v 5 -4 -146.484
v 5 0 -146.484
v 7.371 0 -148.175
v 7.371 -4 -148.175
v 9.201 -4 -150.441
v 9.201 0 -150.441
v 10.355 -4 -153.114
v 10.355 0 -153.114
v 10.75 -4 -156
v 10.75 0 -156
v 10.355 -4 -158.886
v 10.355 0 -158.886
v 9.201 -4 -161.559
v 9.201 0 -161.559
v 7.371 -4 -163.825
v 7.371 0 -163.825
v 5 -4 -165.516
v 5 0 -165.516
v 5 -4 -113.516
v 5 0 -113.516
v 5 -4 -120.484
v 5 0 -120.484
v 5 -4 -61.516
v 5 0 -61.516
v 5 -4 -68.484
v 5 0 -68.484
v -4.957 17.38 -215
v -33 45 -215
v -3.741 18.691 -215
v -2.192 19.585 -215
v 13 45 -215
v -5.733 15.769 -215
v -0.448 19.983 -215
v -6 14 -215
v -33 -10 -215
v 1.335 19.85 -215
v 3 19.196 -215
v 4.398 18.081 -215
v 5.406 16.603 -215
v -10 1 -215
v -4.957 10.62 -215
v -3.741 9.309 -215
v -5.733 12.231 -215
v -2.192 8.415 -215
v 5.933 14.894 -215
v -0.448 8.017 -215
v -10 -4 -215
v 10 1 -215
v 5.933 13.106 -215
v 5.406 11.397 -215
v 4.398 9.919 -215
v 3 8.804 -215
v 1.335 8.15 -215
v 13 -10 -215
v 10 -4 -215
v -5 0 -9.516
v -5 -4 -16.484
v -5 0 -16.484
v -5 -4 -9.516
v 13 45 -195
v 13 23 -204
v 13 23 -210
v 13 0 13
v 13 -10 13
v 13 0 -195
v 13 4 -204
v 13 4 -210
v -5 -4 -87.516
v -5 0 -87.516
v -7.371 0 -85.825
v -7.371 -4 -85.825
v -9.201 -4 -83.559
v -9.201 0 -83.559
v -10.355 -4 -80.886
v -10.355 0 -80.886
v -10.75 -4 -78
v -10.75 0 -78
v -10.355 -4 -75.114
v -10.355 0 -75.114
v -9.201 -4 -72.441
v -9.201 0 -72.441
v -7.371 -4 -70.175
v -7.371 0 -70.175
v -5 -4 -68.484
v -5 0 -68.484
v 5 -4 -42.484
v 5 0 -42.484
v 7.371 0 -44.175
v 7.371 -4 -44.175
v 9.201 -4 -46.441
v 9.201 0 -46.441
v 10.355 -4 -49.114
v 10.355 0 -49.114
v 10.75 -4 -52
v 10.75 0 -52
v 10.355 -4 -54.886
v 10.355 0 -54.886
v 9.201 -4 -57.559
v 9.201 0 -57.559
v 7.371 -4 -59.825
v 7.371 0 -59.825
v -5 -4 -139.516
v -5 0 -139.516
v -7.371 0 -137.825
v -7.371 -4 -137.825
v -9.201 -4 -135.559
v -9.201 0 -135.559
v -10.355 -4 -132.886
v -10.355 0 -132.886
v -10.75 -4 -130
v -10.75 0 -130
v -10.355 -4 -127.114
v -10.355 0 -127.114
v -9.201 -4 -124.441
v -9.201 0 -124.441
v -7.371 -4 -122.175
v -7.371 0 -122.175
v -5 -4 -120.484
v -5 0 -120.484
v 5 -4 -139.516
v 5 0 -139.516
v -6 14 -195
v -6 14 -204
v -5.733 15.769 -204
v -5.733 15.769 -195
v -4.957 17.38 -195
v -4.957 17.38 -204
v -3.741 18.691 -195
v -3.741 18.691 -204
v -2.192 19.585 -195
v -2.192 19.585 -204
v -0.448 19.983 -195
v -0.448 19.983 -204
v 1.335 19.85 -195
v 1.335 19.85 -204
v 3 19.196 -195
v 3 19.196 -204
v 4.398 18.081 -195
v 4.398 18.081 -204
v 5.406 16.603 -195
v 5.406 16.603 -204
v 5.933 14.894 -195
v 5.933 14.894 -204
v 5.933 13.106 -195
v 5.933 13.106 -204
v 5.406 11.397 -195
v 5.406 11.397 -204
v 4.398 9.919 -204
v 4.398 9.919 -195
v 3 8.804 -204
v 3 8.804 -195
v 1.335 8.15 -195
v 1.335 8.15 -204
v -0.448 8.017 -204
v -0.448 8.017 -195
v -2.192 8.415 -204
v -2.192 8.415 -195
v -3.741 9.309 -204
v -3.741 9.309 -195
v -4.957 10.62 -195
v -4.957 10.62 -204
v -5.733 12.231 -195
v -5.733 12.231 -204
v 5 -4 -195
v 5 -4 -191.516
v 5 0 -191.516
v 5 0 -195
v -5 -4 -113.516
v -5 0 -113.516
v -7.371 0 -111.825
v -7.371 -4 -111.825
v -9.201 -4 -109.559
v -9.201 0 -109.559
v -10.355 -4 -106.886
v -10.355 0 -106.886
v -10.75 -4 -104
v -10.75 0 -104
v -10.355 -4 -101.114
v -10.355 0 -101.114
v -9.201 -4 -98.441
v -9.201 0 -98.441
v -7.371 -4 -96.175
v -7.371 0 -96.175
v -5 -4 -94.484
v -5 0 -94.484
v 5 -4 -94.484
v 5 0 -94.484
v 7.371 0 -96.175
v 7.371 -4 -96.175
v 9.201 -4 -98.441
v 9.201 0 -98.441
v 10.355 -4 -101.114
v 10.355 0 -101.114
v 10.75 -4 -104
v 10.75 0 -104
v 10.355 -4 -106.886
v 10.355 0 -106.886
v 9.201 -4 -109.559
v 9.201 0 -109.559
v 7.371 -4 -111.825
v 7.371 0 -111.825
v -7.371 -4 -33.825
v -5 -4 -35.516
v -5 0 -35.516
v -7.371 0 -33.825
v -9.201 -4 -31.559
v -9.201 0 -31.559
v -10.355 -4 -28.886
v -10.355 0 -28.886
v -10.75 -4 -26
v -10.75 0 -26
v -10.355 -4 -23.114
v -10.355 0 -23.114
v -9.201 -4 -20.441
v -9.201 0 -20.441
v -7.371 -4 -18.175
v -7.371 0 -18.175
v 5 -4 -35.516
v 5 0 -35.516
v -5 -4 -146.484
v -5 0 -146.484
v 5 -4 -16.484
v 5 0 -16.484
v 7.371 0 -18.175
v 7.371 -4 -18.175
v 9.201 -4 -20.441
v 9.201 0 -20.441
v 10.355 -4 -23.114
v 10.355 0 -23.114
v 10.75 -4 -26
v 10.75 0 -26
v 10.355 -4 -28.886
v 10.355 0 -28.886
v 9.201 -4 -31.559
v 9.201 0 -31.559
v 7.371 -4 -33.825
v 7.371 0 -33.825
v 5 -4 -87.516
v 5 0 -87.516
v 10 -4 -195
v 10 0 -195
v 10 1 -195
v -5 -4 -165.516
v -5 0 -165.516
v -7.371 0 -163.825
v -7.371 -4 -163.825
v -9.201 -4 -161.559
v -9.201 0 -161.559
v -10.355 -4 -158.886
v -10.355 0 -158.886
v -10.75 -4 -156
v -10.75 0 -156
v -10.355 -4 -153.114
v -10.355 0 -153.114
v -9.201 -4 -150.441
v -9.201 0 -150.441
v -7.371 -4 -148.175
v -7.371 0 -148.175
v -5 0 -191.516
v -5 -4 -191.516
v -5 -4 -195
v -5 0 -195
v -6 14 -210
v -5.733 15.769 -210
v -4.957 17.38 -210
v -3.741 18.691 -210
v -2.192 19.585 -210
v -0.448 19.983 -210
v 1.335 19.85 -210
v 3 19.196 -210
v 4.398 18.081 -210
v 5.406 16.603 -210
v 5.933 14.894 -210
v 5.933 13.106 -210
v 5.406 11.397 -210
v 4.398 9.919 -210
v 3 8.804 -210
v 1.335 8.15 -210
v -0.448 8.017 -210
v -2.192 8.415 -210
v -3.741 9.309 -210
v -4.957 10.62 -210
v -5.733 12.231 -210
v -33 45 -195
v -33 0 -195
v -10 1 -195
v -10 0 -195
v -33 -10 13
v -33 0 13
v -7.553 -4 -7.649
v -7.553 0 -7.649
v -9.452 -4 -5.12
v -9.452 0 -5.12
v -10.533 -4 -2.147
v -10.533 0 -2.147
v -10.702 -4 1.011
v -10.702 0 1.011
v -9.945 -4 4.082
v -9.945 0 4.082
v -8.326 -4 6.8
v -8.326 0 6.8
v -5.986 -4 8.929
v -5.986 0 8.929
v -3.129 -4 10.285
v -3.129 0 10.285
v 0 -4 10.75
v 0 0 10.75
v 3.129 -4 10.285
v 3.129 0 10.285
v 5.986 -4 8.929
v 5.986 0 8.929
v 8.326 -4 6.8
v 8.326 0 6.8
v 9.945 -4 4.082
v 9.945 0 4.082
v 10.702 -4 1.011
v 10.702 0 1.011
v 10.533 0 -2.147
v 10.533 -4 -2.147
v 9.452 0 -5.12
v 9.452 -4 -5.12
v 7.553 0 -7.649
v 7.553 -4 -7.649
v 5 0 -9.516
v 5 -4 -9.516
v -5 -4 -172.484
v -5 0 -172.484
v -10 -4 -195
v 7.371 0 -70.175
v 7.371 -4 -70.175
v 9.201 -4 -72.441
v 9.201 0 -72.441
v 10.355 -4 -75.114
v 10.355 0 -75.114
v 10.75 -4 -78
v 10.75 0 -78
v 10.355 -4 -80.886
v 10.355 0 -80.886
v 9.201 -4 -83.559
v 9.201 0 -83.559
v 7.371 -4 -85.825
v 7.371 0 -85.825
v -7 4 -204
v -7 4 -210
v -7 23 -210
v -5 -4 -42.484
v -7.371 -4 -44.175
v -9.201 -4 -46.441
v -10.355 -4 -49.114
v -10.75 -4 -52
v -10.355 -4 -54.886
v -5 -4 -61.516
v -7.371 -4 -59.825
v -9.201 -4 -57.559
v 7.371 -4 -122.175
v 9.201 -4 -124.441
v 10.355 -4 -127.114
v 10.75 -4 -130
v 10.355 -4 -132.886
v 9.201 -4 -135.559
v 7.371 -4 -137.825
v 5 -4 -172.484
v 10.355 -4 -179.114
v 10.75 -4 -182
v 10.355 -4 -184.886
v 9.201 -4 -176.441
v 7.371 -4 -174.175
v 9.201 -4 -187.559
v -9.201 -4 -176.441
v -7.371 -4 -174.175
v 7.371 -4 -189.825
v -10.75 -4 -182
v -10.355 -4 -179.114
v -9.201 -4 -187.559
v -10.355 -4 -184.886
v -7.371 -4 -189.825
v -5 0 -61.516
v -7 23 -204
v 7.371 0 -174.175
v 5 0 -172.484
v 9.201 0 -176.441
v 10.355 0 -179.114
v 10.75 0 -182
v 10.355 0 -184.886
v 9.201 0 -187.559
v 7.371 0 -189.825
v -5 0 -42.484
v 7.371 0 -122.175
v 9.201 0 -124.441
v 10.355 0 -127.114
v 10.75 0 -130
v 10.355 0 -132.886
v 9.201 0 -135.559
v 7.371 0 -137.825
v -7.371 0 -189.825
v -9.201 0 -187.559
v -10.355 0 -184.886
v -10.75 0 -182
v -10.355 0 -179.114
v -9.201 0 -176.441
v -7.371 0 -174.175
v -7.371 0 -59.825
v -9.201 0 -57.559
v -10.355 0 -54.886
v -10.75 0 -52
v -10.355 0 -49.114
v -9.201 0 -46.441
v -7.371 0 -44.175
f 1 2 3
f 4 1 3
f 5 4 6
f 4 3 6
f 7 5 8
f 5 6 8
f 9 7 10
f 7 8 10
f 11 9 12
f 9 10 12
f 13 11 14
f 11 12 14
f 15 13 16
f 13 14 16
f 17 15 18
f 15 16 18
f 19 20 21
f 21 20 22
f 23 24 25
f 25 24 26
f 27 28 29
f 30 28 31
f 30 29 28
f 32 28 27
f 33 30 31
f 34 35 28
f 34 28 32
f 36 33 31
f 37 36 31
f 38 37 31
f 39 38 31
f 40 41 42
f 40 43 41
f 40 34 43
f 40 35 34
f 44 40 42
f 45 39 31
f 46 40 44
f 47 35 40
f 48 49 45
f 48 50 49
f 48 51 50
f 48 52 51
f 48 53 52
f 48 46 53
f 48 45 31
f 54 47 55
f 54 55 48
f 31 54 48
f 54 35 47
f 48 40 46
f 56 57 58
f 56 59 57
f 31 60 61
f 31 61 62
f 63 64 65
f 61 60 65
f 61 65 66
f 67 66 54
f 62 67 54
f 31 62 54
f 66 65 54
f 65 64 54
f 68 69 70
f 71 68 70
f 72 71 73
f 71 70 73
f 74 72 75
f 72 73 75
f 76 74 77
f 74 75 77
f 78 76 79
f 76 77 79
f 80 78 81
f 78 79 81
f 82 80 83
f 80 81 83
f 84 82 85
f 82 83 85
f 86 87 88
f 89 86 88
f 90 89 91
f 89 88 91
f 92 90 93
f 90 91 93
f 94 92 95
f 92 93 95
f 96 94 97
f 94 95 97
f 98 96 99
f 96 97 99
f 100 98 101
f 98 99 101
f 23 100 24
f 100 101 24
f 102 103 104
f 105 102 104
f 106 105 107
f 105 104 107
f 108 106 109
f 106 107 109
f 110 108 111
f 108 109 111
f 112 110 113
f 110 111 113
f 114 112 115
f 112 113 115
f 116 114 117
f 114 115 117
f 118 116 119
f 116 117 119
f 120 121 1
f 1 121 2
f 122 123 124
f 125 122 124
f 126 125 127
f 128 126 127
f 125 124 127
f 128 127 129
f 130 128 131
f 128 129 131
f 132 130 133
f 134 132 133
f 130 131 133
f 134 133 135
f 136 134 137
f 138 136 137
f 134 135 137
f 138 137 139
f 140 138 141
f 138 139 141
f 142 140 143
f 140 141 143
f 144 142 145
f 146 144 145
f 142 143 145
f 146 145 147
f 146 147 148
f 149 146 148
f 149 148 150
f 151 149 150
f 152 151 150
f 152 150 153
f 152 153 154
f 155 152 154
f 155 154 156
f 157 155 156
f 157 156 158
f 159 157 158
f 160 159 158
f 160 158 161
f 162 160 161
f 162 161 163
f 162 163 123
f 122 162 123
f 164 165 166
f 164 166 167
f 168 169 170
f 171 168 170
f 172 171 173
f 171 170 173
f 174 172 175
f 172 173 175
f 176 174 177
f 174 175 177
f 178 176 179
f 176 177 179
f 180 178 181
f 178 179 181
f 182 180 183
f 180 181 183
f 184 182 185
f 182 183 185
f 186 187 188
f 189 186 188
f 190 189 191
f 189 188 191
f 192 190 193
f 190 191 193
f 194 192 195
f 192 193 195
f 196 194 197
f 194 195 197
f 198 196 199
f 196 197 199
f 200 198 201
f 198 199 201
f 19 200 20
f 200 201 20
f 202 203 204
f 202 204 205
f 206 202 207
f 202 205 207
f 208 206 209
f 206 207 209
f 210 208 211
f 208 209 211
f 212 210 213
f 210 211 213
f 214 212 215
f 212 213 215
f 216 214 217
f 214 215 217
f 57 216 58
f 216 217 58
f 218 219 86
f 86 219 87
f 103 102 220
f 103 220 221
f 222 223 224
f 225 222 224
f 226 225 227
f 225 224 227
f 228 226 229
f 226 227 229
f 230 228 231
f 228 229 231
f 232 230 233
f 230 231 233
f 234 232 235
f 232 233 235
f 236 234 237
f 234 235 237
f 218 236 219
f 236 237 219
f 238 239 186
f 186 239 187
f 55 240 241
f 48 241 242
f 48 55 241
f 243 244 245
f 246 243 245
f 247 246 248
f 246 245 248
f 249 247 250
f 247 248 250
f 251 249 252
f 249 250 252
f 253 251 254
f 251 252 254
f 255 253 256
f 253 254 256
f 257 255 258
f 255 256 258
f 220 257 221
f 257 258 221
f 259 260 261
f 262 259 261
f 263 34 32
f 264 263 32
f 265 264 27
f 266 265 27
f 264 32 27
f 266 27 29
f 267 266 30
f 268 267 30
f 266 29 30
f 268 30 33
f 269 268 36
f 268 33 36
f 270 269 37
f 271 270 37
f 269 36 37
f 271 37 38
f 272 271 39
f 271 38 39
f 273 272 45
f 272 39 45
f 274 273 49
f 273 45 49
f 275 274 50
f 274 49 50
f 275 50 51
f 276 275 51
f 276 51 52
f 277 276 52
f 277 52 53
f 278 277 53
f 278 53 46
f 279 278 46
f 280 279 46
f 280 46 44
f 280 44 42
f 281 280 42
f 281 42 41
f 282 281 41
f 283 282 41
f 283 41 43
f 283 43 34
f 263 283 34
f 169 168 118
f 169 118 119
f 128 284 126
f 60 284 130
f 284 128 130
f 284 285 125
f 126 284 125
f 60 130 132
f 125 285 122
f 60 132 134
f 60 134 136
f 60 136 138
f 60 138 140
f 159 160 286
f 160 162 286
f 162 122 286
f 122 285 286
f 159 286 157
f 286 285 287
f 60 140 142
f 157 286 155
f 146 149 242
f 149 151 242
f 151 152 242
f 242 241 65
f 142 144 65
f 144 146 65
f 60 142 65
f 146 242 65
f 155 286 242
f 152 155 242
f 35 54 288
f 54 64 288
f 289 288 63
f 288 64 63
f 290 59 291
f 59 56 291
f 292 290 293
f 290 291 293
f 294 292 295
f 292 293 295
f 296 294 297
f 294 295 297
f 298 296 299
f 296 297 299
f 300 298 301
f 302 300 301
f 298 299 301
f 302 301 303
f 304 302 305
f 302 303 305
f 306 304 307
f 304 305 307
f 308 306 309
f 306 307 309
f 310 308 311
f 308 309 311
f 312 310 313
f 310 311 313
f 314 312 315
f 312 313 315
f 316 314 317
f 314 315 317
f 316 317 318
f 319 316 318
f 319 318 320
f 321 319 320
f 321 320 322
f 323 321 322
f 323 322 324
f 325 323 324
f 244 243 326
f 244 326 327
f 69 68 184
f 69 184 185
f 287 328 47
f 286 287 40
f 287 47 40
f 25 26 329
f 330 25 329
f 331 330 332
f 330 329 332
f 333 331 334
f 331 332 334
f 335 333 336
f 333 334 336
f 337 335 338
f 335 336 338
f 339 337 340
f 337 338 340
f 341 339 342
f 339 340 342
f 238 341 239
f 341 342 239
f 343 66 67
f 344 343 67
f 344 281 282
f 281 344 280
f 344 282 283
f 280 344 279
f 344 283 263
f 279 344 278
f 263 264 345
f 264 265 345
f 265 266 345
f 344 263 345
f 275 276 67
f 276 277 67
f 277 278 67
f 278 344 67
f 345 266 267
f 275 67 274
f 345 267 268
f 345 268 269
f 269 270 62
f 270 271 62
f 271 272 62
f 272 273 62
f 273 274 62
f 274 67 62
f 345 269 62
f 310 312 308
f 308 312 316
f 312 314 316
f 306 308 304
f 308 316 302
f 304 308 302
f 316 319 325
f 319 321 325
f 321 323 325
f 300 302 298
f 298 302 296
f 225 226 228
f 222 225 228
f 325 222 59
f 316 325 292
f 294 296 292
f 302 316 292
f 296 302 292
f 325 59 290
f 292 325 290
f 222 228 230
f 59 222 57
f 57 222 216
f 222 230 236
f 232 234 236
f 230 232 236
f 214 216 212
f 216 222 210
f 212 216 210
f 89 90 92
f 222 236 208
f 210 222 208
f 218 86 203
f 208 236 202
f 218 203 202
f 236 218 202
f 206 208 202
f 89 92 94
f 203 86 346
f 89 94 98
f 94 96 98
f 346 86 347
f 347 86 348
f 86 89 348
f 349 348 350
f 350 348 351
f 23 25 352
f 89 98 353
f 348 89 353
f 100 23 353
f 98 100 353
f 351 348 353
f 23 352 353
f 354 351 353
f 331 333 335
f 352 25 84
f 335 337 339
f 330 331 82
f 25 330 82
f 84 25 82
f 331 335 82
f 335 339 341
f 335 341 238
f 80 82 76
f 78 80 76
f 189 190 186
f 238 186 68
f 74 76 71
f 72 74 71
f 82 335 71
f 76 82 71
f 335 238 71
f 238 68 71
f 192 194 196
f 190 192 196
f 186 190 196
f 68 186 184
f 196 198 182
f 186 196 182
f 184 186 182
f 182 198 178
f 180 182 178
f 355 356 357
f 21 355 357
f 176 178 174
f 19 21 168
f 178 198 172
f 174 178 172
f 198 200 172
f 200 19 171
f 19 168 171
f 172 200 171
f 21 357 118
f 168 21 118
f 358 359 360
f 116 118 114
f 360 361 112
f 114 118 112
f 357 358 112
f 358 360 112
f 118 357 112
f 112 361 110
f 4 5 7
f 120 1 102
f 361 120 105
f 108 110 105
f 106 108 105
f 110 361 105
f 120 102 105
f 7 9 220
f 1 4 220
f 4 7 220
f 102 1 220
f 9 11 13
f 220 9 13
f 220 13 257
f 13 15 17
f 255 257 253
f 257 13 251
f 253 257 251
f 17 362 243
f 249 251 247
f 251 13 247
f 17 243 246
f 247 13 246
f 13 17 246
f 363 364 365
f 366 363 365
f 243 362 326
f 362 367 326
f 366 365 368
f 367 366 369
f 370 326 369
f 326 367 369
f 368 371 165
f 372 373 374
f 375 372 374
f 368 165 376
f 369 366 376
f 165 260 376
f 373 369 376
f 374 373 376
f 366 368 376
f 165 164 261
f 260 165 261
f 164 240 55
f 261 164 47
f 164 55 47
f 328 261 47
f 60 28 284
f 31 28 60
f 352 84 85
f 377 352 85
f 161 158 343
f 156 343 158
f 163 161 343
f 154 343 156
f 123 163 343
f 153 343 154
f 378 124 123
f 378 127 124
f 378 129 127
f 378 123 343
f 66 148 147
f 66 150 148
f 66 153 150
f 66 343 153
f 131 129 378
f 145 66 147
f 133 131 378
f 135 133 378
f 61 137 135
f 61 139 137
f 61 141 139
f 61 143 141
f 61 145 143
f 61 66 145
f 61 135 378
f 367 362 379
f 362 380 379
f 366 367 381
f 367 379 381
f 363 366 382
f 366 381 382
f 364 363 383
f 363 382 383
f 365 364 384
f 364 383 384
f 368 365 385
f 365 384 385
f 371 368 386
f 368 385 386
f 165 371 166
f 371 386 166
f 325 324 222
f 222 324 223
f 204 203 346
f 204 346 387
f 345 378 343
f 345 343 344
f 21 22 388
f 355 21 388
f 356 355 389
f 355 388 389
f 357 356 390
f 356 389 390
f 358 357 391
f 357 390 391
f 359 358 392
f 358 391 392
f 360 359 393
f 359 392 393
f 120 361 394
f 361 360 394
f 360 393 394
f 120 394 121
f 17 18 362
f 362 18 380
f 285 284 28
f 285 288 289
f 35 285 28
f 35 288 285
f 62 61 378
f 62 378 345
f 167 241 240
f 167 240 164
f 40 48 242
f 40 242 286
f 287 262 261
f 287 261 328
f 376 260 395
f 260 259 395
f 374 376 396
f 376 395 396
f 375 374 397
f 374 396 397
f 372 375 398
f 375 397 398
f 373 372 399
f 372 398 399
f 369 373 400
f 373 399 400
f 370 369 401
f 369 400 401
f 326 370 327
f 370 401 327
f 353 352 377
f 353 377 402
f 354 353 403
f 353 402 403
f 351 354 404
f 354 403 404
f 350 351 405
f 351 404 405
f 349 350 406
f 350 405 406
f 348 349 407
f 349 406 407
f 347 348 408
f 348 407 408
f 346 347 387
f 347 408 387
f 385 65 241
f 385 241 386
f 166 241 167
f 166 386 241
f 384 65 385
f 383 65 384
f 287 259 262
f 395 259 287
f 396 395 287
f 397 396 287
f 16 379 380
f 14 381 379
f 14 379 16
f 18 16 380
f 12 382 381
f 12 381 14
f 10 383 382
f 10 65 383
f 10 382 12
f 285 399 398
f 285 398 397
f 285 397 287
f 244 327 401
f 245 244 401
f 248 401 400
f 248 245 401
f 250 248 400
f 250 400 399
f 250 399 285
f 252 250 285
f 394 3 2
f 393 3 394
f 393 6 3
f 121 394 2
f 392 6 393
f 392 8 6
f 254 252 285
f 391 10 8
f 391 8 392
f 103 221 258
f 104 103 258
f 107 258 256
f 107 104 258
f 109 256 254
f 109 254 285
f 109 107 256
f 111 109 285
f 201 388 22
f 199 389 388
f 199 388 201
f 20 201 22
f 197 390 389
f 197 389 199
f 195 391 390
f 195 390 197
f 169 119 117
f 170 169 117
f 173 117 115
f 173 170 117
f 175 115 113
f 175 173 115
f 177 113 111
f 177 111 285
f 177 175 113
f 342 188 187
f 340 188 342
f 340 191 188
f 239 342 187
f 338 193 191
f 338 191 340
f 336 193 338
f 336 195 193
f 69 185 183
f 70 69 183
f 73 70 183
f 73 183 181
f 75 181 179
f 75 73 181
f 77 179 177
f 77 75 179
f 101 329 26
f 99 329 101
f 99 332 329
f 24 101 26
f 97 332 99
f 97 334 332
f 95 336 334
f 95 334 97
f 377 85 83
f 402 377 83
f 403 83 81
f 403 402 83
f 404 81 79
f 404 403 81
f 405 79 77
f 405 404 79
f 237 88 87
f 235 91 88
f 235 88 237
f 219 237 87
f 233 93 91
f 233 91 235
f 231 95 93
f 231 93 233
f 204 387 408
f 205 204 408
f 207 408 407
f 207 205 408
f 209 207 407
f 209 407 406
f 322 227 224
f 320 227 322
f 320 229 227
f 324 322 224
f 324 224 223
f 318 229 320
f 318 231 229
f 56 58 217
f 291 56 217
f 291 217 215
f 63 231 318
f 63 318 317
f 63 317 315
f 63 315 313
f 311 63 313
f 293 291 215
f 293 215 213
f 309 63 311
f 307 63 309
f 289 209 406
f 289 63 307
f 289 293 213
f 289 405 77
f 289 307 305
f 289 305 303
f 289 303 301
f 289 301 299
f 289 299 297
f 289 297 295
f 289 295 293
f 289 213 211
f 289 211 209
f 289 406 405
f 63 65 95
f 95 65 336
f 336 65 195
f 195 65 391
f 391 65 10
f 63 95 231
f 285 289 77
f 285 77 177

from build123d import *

# Parameters (mm, degrees)
SKETCH5_W           = 26
SKETCH5_H           = 26
BOSS_EXTRUDE1_DEPTH = 10
SKETCH4_R           = 10.75
CUT_EXTRUDE1_DEPTH  = 4
SKETCH6_W           = 10
SKETCH6_H           = 3.483566845
CUT_EXTRUDE2_DEPTH  = 4
LPATTERN1_COUNT     = 8
LPATTERN1_PITCH     = 26
SKETCH7_W           = 10
SKETCH7_H           = 4
CUT_EXTRUDE3_DEPTH  = 183
SKETCH8_W           = 208
SKETCH8_H           = 10
BOSS_EXTRUDE2_DEPTH = 20
SKETCH9_W           = 46
SKETCH9_H           = 10
BOSS_EXTRUDE3_DEPTH = 20
SKETCH10_W          = 46
SKETCH10_H          = 20
BOSS_EXTRUDE4_DEPTH = 45
SKETCH13_W          = 20
SKETCH13_H          = 5
CUT_EXTRUDE4_DEPTH  = 20
SKETCH14_R          = 6
CUT_EXTRUDE5_DEPTH  = 45
SKETCH15_W          = 6
SKETCH15_H          = 19
CUT_EXTRUDE6_DEPTH  = 20


with BuildPart() as part:
    # Sketch5 → Boss-Extrude1 (new body)
    with BuildSketch(Plane(origin=(0, 0, 0), x_dir=(1, 0, 0), z_dir=(0, 1, 0))):
        Rectangle(SKETCH5_W, SKETCH5_H)
    boss_extrude1 = extrude(amount=-BOSS_EXTRUDE1_DEPTH)

    # Sketch4 → Cut-Extrude1 (cut)
    with BuildSketch(Plane(origin=(0, 0, 0), x_dir=(1, 0, 0), z_dir=(0, 1, 0))):
        Circle(SKETCH4_R)
    cut_extrude1 = extrude(amount=-CUT_EXTRUDE1_DEPTH, mode=Mode.SUBTRACT)

    # Sketch6 → Cut-Extrude2 (cut)
    with BuildSketch(Plane(origin=(0, 0, 0), x_dir=(1, 0, 0), z_dir=(0, 1, 0))):
        with Locations((0, 11.258216578)):
            Rectangle(SKETCH6_W, SKETCH6_H)
    cut_extrude2 = extrude(amount=-CUT_EXTRUDE2_DEPTH, mode=Mode.SUBTRACT)

    # LPattern1: Boss-Extrude1, Cut-Extrude1, Cut-Extrude2 ×8
    with Locations(*[(0, 0, -i * LPATTERN1_PITCH) for i in range(1, LPATTERN1_COUNT)]):
        add(boss_extrude1)
        add(cut_extrude1, mode=Mode.SUBTRACT)
        add(cut_extrude2, mode=Mode.SUBTRACT)

    # Sketch7 → Cut-Extrude3 (cut, through all)
    with BuildSketch(Plane.XY.offset(-13)):
        with Locations((0, -2)):
            Rectangle(SKETCH7_W, SKETCH7_H)
    extrude(amount=-CUT_EXTRUDE3_DEPTH, mode=Mode.SUBTRACT)

    # Sketch8 → Boss-Extrude2 (add)
    with BuildSketch(Plane.ZY.offset(13)):
        with Locations((-91, -5)):
            Rectangle(SKETCH8_W, SKETCH8_H)
    extrude(amount=BOSS_EXTRUDE2_DEPTH)

    # Sketch9 → Boss-Extrude3 (add)
    with BuildSketch(Plane(origin=(0, 0, -195), x_dir=(-1, 0, 0), z_dir=(0, 0, -1))):
        with Locations((10, -5)):
            Rectangle(SKETCH9_W, SKETCH9_H)
    extrude(amount=BOSS_EXTRUDE3_DEPTH)

    # Sketch10 → Boss-Extrude4 (add)
    with BuildSketch(Plane(origin=(0, 0, 0), x_dir=(1, 0, 0), z_dir=(0, 1, 0))):
        with Locations((-10, 205)):
            Rectangle(SKETCH10_W, SKETCH10_H)
    extrude(amount=BOSS_EXTRUDE4_DEPTH)

    # Sketch13 → Cut-Extrude4 (cut)
    with BuildSketch(Plane(origin=(0, 0, -215), x_dir=(-1, 0, 0), z_dir=(0, 0, -1))):
        with Locations((0, -1.5)):
            Rectangle(SKETCH13_W, SKETCH13_H)
    extrude(amount=-CUT_EXTRUDE4_DEPTH, mode=Mode.SUBTRACT)

    # Sketch14 → Cut-Extrude5 (cut)
    with BuildSketch(Plane(origin=(0, 0, -215), x_dir=(-1, 0, 0), z_dir=(0, 0, -1))):
        with Locations((0, 14)):
            Circle(SKETCH14_R)
    extrude(amount=-CUT_EXTRUDE5_DEPTH, mode=Mode.SUBTRACT)

    # Sketch15 → Cut-Extrude6 (cut)
    with BuildSketch(Plane(origin=(13, 0, 0), x_dir=(0, 0, -1), z_dir=(1, 0, 0))):
        with Locations((207, 13.5)):
            Rectangle(SKETCH15_W, SKETCH15_H)
    extrude(amount=-CUT_EXTRUDE6_DEPTH, mode=Mode.SUBTRACT)


solid = part.part
